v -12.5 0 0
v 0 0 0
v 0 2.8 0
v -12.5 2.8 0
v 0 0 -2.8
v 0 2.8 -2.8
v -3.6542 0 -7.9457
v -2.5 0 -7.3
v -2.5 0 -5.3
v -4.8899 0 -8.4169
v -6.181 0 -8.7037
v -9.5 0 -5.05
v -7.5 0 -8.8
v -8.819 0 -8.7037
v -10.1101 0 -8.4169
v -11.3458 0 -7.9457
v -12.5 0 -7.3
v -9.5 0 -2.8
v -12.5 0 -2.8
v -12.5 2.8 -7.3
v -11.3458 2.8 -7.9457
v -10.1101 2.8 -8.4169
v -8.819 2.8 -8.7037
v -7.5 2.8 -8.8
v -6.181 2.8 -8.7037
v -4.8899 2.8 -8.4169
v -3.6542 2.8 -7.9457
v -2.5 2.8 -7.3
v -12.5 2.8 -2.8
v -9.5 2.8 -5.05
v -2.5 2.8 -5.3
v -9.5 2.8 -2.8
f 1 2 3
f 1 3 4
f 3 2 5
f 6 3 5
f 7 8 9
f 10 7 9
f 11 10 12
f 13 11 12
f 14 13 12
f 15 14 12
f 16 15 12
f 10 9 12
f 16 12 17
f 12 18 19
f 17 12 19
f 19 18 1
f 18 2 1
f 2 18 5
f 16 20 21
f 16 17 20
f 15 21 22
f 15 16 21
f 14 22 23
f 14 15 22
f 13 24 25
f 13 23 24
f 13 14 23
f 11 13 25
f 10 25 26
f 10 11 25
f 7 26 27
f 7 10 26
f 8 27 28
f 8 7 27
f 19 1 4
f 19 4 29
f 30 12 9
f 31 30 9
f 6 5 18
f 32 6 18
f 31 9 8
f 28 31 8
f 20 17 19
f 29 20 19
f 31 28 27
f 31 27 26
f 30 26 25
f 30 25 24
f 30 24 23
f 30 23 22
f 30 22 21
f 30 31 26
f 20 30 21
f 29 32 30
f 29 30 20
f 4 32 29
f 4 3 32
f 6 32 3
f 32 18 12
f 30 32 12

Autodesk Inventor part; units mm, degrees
ref_plane "YZ Plane" through (0, 0, 0) normal (1, 0, 0) x (0, 1, 0)
ref_plane "XZ Plane" through (0, 0, 0) normal (0, 1, 0) x (-1, 0, 0)
ref_plane "XY Plane" through (0, 0, 0) normal (0, 0, 1) x (1, 0, 0)
sketch "Sketch1" plane through (0, 0, 0) normal (0, 1, 0) x (-1, 0, 0)
  line L0 (0, 0) -> (0, -2.8)
  line L1 (0, -2.8) -> (9.5, -2.8)
  line L2 (0, 0) -> (12.5, 0)
  line L3 (12.5, 0) -> (12.5, -2.8)
  line L4 (9.5, -2.8) -> (9.5, -5.05)
  line L5 (9.5, -5.05) -> (2.5, -5.3)
  line L6 (2.5, -5.3) -> (2.5, -7.3)
  line L7 (12.5, -7.3) -> (12.5, -7.3)
  line L8 (12.5, -7.3) -> (12.5, -2.8)
  line L9 (12.5, -2.8) -> (12.5, -2.8)
  arc A0 (2.5, -7.3) -> (12.5, -7.3) centre (7.5, 0.2833) ccw
  line L10 (14.5304, -7.3) -> (10.3082, -7.3) construction
  dimension "d1" = 2.8
  dimension "d2" = 12.5
  dimension "d3" = 9.5
  dimension "d4" = 3
  dimension "d6" = 4.5
  dimension "d8" = 7.5
  dimension "d9" = 2
  dimension "d13" = 2.25
  dimension "d14" = 10
  dimension "d15" = 1.5
extrude "Extrusion1" add sketch "Sketch1" along normal blind 2.8
properties part number "Cuvette_retainer2"
